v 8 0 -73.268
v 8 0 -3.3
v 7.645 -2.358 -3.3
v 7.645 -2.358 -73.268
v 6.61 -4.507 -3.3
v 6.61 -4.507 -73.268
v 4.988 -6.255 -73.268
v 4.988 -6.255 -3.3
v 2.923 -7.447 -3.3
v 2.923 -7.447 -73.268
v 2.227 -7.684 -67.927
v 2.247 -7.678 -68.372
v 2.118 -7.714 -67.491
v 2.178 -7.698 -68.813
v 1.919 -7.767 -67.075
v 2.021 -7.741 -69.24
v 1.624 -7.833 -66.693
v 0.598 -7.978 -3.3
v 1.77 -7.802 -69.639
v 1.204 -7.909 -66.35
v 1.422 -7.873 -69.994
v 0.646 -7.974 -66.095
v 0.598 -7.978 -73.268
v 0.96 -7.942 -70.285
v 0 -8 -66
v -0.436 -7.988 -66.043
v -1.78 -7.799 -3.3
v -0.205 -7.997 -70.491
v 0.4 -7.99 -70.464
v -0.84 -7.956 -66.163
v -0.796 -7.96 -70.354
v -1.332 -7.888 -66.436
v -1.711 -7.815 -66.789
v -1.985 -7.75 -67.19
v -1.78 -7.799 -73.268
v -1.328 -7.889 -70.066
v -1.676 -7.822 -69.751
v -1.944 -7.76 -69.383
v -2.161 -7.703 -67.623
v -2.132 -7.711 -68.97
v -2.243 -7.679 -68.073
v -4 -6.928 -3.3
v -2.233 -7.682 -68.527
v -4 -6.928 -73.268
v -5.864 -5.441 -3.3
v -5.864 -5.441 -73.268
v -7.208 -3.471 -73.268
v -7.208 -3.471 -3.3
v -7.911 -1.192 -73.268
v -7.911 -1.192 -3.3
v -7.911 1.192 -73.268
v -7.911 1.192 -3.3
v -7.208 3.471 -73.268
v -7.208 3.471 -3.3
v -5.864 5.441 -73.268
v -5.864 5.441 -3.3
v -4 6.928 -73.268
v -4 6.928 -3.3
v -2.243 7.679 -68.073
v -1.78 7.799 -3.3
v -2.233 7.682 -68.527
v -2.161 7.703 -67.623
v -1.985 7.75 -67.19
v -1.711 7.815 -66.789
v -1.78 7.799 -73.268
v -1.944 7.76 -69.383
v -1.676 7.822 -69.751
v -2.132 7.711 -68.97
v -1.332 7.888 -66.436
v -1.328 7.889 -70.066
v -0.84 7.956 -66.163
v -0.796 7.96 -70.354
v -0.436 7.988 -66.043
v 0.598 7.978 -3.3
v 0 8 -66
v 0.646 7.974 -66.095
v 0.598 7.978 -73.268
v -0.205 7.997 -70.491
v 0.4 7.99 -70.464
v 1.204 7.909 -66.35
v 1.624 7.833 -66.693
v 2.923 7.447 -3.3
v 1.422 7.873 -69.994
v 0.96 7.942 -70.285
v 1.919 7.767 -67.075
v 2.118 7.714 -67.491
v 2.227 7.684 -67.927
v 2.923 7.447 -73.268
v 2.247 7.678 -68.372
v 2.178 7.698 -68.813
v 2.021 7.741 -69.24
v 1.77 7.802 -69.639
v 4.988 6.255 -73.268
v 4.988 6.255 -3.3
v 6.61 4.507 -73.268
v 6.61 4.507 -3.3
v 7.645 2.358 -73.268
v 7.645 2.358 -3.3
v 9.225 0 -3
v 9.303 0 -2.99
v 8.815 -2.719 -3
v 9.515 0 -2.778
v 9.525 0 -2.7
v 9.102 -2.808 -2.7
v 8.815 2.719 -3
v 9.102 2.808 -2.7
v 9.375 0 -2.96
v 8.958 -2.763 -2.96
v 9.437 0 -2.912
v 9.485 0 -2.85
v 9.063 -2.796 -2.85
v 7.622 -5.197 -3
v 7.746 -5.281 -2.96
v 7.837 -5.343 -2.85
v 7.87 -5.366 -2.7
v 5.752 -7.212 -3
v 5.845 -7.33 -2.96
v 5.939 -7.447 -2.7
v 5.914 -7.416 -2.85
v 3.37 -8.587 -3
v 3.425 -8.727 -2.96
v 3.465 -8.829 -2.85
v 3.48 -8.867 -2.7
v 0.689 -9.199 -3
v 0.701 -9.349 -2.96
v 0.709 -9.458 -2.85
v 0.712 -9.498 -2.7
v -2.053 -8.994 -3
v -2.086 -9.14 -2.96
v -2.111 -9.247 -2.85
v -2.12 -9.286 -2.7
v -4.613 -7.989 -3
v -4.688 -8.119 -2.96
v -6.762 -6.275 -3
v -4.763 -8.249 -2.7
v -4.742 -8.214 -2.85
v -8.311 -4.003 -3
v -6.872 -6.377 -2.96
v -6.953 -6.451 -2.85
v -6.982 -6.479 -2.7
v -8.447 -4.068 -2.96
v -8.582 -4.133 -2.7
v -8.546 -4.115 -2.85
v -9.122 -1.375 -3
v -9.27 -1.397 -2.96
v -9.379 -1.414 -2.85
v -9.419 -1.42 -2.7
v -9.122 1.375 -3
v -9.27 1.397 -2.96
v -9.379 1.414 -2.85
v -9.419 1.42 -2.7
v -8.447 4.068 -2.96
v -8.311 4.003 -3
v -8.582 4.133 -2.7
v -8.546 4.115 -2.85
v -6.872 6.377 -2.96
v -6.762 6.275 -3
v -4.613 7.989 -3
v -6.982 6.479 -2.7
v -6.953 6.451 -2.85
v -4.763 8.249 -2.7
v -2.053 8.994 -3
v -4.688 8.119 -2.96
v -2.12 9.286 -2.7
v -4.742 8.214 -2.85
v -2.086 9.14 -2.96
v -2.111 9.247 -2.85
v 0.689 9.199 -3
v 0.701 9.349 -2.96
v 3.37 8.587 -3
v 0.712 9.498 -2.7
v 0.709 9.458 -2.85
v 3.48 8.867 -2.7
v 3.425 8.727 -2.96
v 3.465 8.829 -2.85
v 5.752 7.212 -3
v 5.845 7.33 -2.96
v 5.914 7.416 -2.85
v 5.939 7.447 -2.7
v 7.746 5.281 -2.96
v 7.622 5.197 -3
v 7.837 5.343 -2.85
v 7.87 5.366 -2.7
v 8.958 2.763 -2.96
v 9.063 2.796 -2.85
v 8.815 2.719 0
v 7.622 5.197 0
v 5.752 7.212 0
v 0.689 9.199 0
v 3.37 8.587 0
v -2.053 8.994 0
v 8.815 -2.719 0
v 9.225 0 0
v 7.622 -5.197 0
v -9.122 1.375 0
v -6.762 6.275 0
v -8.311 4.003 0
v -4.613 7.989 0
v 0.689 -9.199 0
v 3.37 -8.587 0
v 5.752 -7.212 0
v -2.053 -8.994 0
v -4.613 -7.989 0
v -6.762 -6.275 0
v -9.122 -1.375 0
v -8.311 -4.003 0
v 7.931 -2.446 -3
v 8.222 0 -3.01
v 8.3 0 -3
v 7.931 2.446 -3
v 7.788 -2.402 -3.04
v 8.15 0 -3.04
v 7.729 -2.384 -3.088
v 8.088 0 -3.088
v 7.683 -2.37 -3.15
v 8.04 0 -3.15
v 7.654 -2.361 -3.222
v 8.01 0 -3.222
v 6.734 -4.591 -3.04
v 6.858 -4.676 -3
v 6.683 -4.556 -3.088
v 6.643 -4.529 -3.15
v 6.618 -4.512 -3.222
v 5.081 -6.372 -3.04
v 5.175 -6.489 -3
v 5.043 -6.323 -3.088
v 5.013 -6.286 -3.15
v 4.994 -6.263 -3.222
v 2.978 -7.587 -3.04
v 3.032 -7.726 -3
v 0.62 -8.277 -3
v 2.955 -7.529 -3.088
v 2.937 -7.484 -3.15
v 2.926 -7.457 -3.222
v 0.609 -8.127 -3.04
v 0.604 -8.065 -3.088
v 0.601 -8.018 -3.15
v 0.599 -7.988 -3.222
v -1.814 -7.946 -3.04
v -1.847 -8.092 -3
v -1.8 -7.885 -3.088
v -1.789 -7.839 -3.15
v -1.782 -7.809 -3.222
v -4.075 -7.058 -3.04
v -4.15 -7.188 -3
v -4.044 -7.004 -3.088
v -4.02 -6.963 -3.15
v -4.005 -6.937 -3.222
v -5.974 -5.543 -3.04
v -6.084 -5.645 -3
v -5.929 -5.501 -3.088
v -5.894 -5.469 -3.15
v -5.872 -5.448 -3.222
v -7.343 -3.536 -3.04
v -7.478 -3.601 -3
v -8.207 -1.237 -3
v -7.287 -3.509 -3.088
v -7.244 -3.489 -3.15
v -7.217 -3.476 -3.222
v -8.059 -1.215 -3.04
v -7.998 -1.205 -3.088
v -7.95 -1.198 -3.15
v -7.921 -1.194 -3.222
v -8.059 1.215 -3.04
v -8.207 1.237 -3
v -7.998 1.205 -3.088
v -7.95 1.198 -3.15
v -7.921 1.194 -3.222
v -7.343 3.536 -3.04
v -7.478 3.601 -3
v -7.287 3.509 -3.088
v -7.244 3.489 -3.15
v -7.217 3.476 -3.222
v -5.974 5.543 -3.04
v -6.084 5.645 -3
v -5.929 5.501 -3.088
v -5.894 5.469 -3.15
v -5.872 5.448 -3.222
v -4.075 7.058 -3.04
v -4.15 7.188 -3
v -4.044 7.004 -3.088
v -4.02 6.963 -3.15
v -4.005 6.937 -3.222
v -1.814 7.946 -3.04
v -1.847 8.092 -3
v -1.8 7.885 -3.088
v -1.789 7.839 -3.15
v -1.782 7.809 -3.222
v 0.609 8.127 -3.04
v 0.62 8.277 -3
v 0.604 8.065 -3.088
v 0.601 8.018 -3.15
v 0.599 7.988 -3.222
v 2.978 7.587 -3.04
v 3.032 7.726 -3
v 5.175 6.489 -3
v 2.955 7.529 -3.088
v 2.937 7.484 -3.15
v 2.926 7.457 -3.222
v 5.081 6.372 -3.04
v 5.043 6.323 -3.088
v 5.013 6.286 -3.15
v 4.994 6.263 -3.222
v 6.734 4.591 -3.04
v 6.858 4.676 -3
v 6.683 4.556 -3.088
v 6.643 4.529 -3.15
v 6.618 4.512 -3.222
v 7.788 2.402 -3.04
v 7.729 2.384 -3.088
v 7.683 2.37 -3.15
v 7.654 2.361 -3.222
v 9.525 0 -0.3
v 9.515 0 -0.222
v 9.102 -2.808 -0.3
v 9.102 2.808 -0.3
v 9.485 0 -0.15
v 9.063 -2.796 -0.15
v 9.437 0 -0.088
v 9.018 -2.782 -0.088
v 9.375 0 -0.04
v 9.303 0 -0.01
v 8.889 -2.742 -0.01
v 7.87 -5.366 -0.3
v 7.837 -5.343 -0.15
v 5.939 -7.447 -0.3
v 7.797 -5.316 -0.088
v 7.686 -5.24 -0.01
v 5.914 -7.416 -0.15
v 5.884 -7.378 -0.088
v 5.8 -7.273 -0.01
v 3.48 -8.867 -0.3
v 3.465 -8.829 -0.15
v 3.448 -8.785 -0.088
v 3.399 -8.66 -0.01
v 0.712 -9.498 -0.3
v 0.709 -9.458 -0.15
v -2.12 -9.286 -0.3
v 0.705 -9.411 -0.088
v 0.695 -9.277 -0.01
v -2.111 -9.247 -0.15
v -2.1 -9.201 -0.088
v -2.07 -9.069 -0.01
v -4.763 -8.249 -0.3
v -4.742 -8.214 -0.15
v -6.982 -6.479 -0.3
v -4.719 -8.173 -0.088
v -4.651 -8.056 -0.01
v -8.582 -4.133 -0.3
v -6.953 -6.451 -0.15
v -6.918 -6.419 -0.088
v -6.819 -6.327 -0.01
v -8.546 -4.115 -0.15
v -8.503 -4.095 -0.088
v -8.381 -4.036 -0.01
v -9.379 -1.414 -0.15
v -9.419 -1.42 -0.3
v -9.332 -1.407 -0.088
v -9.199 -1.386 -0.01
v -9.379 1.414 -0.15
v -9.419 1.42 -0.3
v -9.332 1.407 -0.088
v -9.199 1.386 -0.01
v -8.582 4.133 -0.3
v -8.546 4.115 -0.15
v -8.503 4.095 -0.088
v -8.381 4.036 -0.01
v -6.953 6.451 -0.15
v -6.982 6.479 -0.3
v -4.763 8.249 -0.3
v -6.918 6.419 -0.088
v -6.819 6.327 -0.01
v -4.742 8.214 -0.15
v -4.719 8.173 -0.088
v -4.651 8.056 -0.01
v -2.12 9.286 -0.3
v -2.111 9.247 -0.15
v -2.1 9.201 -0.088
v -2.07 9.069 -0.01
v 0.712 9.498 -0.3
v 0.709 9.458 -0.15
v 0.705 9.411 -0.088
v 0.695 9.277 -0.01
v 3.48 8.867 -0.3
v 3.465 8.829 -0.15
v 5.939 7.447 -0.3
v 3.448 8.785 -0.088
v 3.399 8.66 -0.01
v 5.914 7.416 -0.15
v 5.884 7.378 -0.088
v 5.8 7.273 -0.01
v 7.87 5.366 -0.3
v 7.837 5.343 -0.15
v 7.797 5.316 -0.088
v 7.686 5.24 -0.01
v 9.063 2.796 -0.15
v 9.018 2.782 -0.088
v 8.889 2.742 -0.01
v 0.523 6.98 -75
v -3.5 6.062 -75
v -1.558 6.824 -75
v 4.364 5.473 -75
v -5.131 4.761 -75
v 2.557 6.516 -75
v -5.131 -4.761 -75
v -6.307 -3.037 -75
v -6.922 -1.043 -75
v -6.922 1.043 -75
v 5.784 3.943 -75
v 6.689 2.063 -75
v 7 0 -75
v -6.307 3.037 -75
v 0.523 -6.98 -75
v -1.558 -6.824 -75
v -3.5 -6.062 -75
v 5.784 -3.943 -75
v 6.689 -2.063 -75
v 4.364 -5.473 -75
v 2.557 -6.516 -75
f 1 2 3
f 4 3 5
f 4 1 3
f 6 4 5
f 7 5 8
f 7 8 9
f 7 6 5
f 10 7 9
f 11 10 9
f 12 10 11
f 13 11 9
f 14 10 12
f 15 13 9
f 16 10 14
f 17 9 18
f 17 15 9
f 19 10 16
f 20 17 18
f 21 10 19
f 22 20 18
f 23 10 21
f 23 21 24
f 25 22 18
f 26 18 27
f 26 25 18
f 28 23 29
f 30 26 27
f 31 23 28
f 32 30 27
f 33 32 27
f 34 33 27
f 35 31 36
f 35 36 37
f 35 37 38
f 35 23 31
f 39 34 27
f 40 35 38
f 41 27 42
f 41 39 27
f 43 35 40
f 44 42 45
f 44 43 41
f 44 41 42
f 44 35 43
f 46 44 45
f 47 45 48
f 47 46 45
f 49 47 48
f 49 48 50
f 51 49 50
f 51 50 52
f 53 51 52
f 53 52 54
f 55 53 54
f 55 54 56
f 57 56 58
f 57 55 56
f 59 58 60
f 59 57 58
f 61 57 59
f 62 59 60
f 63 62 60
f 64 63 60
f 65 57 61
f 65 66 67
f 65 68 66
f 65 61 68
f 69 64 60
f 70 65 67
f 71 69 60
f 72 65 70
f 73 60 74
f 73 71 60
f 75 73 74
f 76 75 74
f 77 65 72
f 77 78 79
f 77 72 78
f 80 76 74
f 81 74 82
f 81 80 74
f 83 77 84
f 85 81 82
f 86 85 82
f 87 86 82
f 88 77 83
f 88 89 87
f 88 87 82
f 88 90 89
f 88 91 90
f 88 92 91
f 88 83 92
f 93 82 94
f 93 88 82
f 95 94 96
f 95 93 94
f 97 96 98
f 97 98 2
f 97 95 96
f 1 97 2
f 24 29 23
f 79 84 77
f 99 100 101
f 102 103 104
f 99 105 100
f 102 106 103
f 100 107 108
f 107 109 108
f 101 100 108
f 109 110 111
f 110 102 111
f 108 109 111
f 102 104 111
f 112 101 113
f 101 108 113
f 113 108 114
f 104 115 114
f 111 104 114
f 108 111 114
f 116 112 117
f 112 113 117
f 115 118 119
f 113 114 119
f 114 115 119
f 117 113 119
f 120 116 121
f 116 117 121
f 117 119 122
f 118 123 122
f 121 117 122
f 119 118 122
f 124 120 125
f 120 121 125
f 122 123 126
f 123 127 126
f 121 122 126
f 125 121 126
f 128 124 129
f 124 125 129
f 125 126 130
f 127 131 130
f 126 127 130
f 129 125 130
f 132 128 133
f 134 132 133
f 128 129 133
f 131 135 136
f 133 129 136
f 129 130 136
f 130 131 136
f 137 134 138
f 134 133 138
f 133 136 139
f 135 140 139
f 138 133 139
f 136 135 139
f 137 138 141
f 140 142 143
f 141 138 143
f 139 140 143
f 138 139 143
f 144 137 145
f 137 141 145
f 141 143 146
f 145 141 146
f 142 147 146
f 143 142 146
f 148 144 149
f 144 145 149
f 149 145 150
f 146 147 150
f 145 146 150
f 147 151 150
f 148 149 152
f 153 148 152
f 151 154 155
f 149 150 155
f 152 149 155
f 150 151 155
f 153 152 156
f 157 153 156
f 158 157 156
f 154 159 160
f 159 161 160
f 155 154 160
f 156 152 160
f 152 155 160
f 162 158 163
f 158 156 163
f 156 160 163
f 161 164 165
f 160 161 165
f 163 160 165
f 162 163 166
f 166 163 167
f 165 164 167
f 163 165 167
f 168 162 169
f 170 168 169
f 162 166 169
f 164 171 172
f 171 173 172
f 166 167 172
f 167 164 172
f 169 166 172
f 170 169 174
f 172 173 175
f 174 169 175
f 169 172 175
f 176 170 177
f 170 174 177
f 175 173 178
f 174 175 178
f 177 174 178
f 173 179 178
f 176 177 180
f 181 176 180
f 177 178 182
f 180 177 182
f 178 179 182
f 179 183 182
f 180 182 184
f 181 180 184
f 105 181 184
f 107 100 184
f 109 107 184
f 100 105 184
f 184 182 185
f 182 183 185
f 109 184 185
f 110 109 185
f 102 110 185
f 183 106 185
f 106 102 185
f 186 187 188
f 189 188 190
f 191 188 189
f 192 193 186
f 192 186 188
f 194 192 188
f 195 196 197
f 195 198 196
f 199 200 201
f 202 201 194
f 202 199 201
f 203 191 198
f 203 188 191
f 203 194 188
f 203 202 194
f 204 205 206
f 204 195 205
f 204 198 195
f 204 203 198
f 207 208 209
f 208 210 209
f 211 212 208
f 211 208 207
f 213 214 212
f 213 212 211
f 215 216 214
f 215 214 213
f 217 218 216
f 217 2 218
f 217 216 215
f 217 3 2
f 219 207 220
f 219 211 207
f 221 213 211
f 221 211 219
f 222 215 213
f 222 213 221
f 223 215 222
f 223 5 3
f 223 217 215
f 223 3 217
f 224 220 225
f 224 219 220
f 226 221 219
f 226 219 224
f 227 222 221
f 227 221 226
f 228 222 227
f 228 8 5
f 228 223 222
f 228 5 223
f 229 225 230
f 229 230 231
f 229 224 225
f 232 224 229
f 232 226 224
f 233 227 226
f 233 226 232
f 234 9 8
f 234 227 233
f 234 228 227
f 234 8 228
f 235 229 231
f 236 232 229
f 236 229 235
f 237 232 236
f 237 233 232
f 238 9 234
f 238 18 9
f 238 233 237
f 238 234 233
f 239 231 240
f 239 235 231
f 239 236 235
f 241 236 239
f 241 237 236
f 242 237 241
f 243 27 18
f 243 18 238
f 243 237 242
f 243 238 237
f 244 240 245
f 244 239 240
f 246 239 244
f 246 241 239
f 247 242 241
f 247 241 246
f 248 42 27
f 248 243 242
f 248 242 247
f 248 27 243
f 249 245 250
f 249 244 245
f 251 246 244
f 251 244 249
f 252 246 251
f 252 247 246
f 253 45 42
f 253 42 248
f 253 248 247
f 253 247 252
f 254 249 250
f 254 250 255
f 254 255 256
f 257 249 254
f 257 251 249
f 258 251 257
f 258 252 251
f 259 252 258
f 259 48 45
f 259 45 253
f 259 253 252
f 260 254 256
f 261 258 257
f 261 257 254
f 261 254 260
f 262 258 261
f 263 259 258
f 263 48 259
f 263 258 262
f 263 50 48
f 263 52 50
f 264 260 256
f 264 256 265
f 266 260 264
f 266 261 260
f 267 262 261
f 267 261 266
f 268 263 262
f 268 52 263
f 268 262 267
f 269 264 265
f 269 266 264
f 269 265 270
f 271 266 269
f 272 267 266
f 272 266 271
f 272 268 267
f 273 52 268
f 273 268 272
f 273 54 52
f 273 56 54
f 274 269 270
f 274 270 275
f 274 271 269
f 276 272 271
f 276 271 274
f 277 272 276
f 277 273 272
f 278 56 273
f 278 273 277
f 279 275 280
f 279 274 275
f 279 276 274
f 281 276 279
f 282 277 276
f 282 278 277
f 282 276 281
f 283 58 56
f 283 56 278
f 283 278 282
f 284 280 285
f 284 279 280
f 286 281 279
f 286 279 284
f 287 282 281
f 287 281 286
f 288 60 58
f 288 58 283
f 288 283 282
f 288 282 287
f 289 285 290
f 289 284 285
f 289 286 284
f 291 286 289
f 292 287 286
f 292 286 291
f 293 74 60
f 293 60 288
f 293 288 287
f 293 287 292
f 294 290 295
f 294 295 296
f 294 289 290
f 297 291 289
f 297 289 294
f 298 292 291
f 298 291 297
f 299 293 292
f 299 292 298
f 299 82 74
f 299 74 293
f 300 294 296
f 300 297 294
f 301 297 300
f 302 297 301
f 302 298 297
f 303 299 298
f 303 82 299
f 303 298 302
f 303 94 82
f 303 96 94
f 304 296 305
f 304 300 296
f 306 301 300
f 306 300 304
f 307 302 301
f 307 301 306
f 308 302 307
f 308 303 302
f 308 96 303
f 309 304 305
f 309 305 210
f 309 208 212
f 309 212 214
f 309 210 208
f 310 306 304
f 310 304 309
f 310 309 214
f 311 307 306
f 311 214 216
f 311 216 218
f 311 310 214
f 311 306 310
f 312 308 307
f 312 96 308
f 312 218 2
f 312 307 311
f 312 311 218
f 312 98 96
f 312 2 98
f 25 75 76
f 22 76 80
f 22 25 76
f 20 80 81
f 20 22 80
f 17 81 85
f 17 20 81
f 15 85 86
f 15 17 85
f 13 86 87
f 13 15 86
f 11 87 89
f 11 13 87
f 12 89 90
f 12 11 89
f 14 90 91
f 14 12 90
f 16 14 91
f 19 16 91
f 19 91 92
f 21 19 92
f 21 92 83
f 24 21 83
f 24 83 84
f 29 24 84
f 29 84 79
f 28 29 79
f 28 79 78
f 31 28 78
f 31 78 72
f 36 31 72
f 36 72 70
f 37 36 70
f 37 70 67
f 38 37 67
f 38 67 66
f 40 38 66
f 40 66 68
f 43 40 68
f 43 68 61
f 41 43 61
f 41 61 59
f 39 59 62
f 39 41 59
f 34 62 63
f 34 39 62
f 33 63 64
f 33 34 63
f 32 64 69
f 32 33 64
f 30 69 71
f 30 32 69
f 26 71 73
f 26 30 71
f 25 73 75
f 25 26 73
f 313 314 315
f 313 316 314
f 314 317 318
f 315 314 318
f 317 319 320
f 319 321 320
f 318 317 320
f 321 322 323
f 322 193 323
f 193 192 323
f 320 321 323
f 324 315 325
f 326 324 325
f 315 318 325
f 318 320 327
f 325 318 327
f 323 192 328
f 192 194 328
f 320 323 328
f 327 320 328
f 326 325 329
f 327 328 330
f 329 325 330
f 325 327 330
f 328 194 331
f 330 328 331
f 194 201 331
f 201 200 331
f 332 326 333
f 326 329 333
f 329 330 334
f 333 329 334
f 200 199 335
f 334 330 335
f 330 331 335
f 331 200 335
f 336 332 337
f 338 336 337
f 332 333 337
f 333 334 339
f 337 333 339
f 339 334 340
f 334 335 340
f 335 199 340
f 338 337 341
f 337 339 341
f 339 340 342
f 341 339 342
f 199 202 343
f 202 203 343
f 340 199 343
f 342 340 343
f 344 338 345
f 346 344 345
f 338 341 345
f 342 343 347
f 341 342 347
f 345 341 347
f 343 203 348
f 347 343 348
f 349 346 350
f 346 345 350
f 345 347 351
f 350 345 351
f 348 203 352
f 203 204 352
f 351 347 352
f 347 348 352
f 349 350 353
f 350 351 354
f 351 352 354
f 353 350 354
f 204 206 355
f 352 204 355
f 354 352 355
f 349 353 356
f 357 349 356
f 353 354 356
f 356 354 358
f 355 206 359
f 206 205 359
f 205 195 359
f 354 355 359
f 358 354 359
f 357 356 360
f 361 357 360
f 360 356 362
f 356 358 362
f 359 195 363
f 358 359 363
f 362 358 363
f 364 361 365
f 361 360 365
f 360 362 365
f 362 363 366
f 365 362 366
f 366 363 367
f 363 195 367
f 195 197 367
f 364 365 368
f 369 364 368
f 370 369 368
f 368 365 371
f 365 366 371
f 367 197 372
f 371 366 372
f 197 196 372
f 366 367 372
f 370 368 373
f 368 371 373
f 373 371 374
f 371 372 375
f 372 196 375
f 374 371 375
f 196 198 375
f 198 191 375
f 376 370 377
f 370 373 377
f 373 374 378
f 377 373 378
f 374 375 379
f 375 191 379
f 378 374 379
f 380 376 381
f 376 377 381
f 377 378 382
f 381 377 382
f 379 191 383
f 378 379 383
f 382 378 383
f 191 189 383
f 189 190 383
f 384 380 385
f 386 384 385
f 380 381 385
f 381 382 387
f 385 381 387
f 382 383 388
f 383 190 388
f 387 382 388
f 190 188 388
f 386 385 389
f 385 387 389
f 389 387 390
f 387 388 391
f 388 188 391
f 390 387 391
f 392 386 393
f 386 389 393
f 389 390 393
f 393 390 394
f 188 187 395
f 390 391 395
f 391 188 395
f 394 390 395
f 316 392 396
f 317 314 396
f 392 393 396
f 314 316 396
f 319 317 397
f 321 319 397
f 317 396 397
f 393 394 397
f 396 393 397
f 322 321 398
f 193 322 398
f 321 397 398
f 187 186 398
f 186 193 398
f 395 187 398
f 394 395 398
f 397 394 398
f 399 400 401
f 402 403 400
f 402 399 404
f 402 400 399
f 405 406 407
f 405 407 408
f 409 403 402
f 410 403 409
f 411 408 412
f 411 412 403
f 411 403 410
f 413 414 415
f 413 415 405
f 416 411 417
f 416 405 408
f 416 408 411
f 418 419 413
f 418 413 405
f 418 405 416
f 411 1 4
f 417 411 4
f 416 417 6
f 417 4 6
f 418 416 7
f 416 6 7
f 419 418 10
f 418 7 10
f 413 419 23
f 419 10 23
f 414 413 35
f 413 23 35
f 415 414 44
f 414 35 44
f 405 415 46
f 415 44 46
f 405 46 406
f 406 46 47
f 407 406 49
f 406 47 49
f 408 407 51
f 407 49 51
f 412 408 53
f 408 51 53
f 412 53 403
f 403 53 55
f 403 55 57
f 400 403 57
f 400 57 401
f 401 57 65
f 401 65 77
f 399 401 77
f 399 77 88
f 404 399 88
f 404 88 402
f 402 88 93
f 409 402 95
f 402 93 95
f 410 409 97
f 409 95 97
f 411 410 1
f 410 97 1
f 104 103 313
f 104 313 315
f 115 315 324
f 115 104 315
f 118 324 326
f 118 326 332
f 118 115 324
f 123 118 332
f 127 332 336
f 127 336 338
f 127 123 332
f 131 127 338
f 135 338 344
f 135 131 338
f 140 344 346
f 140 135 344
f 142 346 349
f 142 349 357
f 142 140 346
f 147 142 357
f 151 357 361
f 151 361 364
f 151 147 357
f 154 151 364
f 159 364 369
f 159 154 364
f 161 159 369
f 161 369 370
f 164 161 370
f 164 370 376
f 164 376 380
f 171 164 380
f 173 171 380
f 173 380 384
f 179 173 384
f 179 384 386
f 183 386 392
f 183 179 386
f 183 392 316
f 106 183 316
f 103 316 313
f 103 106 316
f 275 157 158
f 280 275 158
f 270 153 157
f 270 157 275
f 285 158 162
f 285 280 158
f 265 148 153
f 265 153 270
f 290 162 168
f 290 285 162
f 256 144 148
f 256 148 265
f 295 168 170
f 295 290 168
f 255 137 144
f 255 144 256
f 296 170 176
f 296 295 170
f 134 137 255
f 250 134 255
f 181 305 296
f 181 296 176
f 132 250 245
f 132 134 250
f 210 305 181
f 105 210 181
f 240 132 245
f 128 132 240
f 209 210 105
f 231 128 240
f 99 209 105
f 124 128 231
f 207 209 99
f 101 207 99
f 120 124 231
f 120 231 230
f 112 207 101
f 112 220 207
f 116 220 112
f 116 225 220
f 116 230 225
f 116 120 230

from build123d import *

# Parameters (mm, degrees)
CORTAR_EXTRUIR1_DEPTH      = 77.200073819
CORTAR_EXTRUIR1_DEPTH_BACK = 77.200073819
CROQUIS2_R                 = 2.25
REDONDEO1_R                = 0.3
CHAFL_N1_SIZE              = 1
CHAFL_N1_SIZE2             = 1.732050808
REDONDEO2_R                = 0.3


with BuildPart() as part:
    # Croquis1 → Revolución1 (revolve)
    with BuildSketch(Plane(origin=(0, 0, 0), x_dir=(0, 0, -1), z_dir=(1, 0, 0)), mode=Mode.PRIVATE) as revoluci_n1_sk:
        Polygon((0, 0), (0, 9.525), (3, 9.525), (3, 8), (75, 8), (75, 0), align=None)
    revolve(revoluci_n1_sk.sketch.rotate(Axis((0, 0, 0), (0, 0, -1)), 90), axis=Axis((0, 0, 0), (0, 0, -1)))

    # Croquis2 → Cortar-Extruir1 (cut, two sides: drawn at the far end of the back side and taken through both)
    with BuildSketch(Plane(origin=(0, 0, 0), x_dir=(1, 0, 0), z_dir=(0, 1, 0)).offset(-CORTAR_EXTRUIR1_DEPTH_BACK)):
        with Locations(Location((0, 68.25, 0), (0, 0, 270))):
            Circle(CROQUIS2_R)
    extrude(amount=CORTAR_EXTRUIR1_DEPTH + CORTAR_EXTRUIR1_DEPTH_BACK, mode=Mode.SUBTRACT)

    # Redondeo1
    redondeo1_edges = [part.edges().sort_by_distance(p)[0] for p in [
        (-8, 0, -3),
    ]]
    fillet(redondeo1_edges, radius=REDONDEO1_R)

    # Chaflán1
    chafl_n1_edges = [part.edges().sort_by_distance(p)[0] for p in [
        (-8, 0, -75),
    ]]
    chafl_n1_side = [part.faces().sort_by_distance(p)[0] for p in [
        (0, 0, -75),
    ]]
    chamfer(chafl_n1_edges, length=CHAFL_N1_SIZE, length2=CHAFL_N1_SIZE2, reference=chafl_n1_side[0])

    # Redondeo2
    redondeo2_edges = [part.edges().sort_by_distance(p)[0] for p in [
        (-9.525, 0, -3),
        (-9.525, 0, 0),
    ]]
    fillet(redondeo2_edges, radius=REDONDEO2_R)


solid = part.part
